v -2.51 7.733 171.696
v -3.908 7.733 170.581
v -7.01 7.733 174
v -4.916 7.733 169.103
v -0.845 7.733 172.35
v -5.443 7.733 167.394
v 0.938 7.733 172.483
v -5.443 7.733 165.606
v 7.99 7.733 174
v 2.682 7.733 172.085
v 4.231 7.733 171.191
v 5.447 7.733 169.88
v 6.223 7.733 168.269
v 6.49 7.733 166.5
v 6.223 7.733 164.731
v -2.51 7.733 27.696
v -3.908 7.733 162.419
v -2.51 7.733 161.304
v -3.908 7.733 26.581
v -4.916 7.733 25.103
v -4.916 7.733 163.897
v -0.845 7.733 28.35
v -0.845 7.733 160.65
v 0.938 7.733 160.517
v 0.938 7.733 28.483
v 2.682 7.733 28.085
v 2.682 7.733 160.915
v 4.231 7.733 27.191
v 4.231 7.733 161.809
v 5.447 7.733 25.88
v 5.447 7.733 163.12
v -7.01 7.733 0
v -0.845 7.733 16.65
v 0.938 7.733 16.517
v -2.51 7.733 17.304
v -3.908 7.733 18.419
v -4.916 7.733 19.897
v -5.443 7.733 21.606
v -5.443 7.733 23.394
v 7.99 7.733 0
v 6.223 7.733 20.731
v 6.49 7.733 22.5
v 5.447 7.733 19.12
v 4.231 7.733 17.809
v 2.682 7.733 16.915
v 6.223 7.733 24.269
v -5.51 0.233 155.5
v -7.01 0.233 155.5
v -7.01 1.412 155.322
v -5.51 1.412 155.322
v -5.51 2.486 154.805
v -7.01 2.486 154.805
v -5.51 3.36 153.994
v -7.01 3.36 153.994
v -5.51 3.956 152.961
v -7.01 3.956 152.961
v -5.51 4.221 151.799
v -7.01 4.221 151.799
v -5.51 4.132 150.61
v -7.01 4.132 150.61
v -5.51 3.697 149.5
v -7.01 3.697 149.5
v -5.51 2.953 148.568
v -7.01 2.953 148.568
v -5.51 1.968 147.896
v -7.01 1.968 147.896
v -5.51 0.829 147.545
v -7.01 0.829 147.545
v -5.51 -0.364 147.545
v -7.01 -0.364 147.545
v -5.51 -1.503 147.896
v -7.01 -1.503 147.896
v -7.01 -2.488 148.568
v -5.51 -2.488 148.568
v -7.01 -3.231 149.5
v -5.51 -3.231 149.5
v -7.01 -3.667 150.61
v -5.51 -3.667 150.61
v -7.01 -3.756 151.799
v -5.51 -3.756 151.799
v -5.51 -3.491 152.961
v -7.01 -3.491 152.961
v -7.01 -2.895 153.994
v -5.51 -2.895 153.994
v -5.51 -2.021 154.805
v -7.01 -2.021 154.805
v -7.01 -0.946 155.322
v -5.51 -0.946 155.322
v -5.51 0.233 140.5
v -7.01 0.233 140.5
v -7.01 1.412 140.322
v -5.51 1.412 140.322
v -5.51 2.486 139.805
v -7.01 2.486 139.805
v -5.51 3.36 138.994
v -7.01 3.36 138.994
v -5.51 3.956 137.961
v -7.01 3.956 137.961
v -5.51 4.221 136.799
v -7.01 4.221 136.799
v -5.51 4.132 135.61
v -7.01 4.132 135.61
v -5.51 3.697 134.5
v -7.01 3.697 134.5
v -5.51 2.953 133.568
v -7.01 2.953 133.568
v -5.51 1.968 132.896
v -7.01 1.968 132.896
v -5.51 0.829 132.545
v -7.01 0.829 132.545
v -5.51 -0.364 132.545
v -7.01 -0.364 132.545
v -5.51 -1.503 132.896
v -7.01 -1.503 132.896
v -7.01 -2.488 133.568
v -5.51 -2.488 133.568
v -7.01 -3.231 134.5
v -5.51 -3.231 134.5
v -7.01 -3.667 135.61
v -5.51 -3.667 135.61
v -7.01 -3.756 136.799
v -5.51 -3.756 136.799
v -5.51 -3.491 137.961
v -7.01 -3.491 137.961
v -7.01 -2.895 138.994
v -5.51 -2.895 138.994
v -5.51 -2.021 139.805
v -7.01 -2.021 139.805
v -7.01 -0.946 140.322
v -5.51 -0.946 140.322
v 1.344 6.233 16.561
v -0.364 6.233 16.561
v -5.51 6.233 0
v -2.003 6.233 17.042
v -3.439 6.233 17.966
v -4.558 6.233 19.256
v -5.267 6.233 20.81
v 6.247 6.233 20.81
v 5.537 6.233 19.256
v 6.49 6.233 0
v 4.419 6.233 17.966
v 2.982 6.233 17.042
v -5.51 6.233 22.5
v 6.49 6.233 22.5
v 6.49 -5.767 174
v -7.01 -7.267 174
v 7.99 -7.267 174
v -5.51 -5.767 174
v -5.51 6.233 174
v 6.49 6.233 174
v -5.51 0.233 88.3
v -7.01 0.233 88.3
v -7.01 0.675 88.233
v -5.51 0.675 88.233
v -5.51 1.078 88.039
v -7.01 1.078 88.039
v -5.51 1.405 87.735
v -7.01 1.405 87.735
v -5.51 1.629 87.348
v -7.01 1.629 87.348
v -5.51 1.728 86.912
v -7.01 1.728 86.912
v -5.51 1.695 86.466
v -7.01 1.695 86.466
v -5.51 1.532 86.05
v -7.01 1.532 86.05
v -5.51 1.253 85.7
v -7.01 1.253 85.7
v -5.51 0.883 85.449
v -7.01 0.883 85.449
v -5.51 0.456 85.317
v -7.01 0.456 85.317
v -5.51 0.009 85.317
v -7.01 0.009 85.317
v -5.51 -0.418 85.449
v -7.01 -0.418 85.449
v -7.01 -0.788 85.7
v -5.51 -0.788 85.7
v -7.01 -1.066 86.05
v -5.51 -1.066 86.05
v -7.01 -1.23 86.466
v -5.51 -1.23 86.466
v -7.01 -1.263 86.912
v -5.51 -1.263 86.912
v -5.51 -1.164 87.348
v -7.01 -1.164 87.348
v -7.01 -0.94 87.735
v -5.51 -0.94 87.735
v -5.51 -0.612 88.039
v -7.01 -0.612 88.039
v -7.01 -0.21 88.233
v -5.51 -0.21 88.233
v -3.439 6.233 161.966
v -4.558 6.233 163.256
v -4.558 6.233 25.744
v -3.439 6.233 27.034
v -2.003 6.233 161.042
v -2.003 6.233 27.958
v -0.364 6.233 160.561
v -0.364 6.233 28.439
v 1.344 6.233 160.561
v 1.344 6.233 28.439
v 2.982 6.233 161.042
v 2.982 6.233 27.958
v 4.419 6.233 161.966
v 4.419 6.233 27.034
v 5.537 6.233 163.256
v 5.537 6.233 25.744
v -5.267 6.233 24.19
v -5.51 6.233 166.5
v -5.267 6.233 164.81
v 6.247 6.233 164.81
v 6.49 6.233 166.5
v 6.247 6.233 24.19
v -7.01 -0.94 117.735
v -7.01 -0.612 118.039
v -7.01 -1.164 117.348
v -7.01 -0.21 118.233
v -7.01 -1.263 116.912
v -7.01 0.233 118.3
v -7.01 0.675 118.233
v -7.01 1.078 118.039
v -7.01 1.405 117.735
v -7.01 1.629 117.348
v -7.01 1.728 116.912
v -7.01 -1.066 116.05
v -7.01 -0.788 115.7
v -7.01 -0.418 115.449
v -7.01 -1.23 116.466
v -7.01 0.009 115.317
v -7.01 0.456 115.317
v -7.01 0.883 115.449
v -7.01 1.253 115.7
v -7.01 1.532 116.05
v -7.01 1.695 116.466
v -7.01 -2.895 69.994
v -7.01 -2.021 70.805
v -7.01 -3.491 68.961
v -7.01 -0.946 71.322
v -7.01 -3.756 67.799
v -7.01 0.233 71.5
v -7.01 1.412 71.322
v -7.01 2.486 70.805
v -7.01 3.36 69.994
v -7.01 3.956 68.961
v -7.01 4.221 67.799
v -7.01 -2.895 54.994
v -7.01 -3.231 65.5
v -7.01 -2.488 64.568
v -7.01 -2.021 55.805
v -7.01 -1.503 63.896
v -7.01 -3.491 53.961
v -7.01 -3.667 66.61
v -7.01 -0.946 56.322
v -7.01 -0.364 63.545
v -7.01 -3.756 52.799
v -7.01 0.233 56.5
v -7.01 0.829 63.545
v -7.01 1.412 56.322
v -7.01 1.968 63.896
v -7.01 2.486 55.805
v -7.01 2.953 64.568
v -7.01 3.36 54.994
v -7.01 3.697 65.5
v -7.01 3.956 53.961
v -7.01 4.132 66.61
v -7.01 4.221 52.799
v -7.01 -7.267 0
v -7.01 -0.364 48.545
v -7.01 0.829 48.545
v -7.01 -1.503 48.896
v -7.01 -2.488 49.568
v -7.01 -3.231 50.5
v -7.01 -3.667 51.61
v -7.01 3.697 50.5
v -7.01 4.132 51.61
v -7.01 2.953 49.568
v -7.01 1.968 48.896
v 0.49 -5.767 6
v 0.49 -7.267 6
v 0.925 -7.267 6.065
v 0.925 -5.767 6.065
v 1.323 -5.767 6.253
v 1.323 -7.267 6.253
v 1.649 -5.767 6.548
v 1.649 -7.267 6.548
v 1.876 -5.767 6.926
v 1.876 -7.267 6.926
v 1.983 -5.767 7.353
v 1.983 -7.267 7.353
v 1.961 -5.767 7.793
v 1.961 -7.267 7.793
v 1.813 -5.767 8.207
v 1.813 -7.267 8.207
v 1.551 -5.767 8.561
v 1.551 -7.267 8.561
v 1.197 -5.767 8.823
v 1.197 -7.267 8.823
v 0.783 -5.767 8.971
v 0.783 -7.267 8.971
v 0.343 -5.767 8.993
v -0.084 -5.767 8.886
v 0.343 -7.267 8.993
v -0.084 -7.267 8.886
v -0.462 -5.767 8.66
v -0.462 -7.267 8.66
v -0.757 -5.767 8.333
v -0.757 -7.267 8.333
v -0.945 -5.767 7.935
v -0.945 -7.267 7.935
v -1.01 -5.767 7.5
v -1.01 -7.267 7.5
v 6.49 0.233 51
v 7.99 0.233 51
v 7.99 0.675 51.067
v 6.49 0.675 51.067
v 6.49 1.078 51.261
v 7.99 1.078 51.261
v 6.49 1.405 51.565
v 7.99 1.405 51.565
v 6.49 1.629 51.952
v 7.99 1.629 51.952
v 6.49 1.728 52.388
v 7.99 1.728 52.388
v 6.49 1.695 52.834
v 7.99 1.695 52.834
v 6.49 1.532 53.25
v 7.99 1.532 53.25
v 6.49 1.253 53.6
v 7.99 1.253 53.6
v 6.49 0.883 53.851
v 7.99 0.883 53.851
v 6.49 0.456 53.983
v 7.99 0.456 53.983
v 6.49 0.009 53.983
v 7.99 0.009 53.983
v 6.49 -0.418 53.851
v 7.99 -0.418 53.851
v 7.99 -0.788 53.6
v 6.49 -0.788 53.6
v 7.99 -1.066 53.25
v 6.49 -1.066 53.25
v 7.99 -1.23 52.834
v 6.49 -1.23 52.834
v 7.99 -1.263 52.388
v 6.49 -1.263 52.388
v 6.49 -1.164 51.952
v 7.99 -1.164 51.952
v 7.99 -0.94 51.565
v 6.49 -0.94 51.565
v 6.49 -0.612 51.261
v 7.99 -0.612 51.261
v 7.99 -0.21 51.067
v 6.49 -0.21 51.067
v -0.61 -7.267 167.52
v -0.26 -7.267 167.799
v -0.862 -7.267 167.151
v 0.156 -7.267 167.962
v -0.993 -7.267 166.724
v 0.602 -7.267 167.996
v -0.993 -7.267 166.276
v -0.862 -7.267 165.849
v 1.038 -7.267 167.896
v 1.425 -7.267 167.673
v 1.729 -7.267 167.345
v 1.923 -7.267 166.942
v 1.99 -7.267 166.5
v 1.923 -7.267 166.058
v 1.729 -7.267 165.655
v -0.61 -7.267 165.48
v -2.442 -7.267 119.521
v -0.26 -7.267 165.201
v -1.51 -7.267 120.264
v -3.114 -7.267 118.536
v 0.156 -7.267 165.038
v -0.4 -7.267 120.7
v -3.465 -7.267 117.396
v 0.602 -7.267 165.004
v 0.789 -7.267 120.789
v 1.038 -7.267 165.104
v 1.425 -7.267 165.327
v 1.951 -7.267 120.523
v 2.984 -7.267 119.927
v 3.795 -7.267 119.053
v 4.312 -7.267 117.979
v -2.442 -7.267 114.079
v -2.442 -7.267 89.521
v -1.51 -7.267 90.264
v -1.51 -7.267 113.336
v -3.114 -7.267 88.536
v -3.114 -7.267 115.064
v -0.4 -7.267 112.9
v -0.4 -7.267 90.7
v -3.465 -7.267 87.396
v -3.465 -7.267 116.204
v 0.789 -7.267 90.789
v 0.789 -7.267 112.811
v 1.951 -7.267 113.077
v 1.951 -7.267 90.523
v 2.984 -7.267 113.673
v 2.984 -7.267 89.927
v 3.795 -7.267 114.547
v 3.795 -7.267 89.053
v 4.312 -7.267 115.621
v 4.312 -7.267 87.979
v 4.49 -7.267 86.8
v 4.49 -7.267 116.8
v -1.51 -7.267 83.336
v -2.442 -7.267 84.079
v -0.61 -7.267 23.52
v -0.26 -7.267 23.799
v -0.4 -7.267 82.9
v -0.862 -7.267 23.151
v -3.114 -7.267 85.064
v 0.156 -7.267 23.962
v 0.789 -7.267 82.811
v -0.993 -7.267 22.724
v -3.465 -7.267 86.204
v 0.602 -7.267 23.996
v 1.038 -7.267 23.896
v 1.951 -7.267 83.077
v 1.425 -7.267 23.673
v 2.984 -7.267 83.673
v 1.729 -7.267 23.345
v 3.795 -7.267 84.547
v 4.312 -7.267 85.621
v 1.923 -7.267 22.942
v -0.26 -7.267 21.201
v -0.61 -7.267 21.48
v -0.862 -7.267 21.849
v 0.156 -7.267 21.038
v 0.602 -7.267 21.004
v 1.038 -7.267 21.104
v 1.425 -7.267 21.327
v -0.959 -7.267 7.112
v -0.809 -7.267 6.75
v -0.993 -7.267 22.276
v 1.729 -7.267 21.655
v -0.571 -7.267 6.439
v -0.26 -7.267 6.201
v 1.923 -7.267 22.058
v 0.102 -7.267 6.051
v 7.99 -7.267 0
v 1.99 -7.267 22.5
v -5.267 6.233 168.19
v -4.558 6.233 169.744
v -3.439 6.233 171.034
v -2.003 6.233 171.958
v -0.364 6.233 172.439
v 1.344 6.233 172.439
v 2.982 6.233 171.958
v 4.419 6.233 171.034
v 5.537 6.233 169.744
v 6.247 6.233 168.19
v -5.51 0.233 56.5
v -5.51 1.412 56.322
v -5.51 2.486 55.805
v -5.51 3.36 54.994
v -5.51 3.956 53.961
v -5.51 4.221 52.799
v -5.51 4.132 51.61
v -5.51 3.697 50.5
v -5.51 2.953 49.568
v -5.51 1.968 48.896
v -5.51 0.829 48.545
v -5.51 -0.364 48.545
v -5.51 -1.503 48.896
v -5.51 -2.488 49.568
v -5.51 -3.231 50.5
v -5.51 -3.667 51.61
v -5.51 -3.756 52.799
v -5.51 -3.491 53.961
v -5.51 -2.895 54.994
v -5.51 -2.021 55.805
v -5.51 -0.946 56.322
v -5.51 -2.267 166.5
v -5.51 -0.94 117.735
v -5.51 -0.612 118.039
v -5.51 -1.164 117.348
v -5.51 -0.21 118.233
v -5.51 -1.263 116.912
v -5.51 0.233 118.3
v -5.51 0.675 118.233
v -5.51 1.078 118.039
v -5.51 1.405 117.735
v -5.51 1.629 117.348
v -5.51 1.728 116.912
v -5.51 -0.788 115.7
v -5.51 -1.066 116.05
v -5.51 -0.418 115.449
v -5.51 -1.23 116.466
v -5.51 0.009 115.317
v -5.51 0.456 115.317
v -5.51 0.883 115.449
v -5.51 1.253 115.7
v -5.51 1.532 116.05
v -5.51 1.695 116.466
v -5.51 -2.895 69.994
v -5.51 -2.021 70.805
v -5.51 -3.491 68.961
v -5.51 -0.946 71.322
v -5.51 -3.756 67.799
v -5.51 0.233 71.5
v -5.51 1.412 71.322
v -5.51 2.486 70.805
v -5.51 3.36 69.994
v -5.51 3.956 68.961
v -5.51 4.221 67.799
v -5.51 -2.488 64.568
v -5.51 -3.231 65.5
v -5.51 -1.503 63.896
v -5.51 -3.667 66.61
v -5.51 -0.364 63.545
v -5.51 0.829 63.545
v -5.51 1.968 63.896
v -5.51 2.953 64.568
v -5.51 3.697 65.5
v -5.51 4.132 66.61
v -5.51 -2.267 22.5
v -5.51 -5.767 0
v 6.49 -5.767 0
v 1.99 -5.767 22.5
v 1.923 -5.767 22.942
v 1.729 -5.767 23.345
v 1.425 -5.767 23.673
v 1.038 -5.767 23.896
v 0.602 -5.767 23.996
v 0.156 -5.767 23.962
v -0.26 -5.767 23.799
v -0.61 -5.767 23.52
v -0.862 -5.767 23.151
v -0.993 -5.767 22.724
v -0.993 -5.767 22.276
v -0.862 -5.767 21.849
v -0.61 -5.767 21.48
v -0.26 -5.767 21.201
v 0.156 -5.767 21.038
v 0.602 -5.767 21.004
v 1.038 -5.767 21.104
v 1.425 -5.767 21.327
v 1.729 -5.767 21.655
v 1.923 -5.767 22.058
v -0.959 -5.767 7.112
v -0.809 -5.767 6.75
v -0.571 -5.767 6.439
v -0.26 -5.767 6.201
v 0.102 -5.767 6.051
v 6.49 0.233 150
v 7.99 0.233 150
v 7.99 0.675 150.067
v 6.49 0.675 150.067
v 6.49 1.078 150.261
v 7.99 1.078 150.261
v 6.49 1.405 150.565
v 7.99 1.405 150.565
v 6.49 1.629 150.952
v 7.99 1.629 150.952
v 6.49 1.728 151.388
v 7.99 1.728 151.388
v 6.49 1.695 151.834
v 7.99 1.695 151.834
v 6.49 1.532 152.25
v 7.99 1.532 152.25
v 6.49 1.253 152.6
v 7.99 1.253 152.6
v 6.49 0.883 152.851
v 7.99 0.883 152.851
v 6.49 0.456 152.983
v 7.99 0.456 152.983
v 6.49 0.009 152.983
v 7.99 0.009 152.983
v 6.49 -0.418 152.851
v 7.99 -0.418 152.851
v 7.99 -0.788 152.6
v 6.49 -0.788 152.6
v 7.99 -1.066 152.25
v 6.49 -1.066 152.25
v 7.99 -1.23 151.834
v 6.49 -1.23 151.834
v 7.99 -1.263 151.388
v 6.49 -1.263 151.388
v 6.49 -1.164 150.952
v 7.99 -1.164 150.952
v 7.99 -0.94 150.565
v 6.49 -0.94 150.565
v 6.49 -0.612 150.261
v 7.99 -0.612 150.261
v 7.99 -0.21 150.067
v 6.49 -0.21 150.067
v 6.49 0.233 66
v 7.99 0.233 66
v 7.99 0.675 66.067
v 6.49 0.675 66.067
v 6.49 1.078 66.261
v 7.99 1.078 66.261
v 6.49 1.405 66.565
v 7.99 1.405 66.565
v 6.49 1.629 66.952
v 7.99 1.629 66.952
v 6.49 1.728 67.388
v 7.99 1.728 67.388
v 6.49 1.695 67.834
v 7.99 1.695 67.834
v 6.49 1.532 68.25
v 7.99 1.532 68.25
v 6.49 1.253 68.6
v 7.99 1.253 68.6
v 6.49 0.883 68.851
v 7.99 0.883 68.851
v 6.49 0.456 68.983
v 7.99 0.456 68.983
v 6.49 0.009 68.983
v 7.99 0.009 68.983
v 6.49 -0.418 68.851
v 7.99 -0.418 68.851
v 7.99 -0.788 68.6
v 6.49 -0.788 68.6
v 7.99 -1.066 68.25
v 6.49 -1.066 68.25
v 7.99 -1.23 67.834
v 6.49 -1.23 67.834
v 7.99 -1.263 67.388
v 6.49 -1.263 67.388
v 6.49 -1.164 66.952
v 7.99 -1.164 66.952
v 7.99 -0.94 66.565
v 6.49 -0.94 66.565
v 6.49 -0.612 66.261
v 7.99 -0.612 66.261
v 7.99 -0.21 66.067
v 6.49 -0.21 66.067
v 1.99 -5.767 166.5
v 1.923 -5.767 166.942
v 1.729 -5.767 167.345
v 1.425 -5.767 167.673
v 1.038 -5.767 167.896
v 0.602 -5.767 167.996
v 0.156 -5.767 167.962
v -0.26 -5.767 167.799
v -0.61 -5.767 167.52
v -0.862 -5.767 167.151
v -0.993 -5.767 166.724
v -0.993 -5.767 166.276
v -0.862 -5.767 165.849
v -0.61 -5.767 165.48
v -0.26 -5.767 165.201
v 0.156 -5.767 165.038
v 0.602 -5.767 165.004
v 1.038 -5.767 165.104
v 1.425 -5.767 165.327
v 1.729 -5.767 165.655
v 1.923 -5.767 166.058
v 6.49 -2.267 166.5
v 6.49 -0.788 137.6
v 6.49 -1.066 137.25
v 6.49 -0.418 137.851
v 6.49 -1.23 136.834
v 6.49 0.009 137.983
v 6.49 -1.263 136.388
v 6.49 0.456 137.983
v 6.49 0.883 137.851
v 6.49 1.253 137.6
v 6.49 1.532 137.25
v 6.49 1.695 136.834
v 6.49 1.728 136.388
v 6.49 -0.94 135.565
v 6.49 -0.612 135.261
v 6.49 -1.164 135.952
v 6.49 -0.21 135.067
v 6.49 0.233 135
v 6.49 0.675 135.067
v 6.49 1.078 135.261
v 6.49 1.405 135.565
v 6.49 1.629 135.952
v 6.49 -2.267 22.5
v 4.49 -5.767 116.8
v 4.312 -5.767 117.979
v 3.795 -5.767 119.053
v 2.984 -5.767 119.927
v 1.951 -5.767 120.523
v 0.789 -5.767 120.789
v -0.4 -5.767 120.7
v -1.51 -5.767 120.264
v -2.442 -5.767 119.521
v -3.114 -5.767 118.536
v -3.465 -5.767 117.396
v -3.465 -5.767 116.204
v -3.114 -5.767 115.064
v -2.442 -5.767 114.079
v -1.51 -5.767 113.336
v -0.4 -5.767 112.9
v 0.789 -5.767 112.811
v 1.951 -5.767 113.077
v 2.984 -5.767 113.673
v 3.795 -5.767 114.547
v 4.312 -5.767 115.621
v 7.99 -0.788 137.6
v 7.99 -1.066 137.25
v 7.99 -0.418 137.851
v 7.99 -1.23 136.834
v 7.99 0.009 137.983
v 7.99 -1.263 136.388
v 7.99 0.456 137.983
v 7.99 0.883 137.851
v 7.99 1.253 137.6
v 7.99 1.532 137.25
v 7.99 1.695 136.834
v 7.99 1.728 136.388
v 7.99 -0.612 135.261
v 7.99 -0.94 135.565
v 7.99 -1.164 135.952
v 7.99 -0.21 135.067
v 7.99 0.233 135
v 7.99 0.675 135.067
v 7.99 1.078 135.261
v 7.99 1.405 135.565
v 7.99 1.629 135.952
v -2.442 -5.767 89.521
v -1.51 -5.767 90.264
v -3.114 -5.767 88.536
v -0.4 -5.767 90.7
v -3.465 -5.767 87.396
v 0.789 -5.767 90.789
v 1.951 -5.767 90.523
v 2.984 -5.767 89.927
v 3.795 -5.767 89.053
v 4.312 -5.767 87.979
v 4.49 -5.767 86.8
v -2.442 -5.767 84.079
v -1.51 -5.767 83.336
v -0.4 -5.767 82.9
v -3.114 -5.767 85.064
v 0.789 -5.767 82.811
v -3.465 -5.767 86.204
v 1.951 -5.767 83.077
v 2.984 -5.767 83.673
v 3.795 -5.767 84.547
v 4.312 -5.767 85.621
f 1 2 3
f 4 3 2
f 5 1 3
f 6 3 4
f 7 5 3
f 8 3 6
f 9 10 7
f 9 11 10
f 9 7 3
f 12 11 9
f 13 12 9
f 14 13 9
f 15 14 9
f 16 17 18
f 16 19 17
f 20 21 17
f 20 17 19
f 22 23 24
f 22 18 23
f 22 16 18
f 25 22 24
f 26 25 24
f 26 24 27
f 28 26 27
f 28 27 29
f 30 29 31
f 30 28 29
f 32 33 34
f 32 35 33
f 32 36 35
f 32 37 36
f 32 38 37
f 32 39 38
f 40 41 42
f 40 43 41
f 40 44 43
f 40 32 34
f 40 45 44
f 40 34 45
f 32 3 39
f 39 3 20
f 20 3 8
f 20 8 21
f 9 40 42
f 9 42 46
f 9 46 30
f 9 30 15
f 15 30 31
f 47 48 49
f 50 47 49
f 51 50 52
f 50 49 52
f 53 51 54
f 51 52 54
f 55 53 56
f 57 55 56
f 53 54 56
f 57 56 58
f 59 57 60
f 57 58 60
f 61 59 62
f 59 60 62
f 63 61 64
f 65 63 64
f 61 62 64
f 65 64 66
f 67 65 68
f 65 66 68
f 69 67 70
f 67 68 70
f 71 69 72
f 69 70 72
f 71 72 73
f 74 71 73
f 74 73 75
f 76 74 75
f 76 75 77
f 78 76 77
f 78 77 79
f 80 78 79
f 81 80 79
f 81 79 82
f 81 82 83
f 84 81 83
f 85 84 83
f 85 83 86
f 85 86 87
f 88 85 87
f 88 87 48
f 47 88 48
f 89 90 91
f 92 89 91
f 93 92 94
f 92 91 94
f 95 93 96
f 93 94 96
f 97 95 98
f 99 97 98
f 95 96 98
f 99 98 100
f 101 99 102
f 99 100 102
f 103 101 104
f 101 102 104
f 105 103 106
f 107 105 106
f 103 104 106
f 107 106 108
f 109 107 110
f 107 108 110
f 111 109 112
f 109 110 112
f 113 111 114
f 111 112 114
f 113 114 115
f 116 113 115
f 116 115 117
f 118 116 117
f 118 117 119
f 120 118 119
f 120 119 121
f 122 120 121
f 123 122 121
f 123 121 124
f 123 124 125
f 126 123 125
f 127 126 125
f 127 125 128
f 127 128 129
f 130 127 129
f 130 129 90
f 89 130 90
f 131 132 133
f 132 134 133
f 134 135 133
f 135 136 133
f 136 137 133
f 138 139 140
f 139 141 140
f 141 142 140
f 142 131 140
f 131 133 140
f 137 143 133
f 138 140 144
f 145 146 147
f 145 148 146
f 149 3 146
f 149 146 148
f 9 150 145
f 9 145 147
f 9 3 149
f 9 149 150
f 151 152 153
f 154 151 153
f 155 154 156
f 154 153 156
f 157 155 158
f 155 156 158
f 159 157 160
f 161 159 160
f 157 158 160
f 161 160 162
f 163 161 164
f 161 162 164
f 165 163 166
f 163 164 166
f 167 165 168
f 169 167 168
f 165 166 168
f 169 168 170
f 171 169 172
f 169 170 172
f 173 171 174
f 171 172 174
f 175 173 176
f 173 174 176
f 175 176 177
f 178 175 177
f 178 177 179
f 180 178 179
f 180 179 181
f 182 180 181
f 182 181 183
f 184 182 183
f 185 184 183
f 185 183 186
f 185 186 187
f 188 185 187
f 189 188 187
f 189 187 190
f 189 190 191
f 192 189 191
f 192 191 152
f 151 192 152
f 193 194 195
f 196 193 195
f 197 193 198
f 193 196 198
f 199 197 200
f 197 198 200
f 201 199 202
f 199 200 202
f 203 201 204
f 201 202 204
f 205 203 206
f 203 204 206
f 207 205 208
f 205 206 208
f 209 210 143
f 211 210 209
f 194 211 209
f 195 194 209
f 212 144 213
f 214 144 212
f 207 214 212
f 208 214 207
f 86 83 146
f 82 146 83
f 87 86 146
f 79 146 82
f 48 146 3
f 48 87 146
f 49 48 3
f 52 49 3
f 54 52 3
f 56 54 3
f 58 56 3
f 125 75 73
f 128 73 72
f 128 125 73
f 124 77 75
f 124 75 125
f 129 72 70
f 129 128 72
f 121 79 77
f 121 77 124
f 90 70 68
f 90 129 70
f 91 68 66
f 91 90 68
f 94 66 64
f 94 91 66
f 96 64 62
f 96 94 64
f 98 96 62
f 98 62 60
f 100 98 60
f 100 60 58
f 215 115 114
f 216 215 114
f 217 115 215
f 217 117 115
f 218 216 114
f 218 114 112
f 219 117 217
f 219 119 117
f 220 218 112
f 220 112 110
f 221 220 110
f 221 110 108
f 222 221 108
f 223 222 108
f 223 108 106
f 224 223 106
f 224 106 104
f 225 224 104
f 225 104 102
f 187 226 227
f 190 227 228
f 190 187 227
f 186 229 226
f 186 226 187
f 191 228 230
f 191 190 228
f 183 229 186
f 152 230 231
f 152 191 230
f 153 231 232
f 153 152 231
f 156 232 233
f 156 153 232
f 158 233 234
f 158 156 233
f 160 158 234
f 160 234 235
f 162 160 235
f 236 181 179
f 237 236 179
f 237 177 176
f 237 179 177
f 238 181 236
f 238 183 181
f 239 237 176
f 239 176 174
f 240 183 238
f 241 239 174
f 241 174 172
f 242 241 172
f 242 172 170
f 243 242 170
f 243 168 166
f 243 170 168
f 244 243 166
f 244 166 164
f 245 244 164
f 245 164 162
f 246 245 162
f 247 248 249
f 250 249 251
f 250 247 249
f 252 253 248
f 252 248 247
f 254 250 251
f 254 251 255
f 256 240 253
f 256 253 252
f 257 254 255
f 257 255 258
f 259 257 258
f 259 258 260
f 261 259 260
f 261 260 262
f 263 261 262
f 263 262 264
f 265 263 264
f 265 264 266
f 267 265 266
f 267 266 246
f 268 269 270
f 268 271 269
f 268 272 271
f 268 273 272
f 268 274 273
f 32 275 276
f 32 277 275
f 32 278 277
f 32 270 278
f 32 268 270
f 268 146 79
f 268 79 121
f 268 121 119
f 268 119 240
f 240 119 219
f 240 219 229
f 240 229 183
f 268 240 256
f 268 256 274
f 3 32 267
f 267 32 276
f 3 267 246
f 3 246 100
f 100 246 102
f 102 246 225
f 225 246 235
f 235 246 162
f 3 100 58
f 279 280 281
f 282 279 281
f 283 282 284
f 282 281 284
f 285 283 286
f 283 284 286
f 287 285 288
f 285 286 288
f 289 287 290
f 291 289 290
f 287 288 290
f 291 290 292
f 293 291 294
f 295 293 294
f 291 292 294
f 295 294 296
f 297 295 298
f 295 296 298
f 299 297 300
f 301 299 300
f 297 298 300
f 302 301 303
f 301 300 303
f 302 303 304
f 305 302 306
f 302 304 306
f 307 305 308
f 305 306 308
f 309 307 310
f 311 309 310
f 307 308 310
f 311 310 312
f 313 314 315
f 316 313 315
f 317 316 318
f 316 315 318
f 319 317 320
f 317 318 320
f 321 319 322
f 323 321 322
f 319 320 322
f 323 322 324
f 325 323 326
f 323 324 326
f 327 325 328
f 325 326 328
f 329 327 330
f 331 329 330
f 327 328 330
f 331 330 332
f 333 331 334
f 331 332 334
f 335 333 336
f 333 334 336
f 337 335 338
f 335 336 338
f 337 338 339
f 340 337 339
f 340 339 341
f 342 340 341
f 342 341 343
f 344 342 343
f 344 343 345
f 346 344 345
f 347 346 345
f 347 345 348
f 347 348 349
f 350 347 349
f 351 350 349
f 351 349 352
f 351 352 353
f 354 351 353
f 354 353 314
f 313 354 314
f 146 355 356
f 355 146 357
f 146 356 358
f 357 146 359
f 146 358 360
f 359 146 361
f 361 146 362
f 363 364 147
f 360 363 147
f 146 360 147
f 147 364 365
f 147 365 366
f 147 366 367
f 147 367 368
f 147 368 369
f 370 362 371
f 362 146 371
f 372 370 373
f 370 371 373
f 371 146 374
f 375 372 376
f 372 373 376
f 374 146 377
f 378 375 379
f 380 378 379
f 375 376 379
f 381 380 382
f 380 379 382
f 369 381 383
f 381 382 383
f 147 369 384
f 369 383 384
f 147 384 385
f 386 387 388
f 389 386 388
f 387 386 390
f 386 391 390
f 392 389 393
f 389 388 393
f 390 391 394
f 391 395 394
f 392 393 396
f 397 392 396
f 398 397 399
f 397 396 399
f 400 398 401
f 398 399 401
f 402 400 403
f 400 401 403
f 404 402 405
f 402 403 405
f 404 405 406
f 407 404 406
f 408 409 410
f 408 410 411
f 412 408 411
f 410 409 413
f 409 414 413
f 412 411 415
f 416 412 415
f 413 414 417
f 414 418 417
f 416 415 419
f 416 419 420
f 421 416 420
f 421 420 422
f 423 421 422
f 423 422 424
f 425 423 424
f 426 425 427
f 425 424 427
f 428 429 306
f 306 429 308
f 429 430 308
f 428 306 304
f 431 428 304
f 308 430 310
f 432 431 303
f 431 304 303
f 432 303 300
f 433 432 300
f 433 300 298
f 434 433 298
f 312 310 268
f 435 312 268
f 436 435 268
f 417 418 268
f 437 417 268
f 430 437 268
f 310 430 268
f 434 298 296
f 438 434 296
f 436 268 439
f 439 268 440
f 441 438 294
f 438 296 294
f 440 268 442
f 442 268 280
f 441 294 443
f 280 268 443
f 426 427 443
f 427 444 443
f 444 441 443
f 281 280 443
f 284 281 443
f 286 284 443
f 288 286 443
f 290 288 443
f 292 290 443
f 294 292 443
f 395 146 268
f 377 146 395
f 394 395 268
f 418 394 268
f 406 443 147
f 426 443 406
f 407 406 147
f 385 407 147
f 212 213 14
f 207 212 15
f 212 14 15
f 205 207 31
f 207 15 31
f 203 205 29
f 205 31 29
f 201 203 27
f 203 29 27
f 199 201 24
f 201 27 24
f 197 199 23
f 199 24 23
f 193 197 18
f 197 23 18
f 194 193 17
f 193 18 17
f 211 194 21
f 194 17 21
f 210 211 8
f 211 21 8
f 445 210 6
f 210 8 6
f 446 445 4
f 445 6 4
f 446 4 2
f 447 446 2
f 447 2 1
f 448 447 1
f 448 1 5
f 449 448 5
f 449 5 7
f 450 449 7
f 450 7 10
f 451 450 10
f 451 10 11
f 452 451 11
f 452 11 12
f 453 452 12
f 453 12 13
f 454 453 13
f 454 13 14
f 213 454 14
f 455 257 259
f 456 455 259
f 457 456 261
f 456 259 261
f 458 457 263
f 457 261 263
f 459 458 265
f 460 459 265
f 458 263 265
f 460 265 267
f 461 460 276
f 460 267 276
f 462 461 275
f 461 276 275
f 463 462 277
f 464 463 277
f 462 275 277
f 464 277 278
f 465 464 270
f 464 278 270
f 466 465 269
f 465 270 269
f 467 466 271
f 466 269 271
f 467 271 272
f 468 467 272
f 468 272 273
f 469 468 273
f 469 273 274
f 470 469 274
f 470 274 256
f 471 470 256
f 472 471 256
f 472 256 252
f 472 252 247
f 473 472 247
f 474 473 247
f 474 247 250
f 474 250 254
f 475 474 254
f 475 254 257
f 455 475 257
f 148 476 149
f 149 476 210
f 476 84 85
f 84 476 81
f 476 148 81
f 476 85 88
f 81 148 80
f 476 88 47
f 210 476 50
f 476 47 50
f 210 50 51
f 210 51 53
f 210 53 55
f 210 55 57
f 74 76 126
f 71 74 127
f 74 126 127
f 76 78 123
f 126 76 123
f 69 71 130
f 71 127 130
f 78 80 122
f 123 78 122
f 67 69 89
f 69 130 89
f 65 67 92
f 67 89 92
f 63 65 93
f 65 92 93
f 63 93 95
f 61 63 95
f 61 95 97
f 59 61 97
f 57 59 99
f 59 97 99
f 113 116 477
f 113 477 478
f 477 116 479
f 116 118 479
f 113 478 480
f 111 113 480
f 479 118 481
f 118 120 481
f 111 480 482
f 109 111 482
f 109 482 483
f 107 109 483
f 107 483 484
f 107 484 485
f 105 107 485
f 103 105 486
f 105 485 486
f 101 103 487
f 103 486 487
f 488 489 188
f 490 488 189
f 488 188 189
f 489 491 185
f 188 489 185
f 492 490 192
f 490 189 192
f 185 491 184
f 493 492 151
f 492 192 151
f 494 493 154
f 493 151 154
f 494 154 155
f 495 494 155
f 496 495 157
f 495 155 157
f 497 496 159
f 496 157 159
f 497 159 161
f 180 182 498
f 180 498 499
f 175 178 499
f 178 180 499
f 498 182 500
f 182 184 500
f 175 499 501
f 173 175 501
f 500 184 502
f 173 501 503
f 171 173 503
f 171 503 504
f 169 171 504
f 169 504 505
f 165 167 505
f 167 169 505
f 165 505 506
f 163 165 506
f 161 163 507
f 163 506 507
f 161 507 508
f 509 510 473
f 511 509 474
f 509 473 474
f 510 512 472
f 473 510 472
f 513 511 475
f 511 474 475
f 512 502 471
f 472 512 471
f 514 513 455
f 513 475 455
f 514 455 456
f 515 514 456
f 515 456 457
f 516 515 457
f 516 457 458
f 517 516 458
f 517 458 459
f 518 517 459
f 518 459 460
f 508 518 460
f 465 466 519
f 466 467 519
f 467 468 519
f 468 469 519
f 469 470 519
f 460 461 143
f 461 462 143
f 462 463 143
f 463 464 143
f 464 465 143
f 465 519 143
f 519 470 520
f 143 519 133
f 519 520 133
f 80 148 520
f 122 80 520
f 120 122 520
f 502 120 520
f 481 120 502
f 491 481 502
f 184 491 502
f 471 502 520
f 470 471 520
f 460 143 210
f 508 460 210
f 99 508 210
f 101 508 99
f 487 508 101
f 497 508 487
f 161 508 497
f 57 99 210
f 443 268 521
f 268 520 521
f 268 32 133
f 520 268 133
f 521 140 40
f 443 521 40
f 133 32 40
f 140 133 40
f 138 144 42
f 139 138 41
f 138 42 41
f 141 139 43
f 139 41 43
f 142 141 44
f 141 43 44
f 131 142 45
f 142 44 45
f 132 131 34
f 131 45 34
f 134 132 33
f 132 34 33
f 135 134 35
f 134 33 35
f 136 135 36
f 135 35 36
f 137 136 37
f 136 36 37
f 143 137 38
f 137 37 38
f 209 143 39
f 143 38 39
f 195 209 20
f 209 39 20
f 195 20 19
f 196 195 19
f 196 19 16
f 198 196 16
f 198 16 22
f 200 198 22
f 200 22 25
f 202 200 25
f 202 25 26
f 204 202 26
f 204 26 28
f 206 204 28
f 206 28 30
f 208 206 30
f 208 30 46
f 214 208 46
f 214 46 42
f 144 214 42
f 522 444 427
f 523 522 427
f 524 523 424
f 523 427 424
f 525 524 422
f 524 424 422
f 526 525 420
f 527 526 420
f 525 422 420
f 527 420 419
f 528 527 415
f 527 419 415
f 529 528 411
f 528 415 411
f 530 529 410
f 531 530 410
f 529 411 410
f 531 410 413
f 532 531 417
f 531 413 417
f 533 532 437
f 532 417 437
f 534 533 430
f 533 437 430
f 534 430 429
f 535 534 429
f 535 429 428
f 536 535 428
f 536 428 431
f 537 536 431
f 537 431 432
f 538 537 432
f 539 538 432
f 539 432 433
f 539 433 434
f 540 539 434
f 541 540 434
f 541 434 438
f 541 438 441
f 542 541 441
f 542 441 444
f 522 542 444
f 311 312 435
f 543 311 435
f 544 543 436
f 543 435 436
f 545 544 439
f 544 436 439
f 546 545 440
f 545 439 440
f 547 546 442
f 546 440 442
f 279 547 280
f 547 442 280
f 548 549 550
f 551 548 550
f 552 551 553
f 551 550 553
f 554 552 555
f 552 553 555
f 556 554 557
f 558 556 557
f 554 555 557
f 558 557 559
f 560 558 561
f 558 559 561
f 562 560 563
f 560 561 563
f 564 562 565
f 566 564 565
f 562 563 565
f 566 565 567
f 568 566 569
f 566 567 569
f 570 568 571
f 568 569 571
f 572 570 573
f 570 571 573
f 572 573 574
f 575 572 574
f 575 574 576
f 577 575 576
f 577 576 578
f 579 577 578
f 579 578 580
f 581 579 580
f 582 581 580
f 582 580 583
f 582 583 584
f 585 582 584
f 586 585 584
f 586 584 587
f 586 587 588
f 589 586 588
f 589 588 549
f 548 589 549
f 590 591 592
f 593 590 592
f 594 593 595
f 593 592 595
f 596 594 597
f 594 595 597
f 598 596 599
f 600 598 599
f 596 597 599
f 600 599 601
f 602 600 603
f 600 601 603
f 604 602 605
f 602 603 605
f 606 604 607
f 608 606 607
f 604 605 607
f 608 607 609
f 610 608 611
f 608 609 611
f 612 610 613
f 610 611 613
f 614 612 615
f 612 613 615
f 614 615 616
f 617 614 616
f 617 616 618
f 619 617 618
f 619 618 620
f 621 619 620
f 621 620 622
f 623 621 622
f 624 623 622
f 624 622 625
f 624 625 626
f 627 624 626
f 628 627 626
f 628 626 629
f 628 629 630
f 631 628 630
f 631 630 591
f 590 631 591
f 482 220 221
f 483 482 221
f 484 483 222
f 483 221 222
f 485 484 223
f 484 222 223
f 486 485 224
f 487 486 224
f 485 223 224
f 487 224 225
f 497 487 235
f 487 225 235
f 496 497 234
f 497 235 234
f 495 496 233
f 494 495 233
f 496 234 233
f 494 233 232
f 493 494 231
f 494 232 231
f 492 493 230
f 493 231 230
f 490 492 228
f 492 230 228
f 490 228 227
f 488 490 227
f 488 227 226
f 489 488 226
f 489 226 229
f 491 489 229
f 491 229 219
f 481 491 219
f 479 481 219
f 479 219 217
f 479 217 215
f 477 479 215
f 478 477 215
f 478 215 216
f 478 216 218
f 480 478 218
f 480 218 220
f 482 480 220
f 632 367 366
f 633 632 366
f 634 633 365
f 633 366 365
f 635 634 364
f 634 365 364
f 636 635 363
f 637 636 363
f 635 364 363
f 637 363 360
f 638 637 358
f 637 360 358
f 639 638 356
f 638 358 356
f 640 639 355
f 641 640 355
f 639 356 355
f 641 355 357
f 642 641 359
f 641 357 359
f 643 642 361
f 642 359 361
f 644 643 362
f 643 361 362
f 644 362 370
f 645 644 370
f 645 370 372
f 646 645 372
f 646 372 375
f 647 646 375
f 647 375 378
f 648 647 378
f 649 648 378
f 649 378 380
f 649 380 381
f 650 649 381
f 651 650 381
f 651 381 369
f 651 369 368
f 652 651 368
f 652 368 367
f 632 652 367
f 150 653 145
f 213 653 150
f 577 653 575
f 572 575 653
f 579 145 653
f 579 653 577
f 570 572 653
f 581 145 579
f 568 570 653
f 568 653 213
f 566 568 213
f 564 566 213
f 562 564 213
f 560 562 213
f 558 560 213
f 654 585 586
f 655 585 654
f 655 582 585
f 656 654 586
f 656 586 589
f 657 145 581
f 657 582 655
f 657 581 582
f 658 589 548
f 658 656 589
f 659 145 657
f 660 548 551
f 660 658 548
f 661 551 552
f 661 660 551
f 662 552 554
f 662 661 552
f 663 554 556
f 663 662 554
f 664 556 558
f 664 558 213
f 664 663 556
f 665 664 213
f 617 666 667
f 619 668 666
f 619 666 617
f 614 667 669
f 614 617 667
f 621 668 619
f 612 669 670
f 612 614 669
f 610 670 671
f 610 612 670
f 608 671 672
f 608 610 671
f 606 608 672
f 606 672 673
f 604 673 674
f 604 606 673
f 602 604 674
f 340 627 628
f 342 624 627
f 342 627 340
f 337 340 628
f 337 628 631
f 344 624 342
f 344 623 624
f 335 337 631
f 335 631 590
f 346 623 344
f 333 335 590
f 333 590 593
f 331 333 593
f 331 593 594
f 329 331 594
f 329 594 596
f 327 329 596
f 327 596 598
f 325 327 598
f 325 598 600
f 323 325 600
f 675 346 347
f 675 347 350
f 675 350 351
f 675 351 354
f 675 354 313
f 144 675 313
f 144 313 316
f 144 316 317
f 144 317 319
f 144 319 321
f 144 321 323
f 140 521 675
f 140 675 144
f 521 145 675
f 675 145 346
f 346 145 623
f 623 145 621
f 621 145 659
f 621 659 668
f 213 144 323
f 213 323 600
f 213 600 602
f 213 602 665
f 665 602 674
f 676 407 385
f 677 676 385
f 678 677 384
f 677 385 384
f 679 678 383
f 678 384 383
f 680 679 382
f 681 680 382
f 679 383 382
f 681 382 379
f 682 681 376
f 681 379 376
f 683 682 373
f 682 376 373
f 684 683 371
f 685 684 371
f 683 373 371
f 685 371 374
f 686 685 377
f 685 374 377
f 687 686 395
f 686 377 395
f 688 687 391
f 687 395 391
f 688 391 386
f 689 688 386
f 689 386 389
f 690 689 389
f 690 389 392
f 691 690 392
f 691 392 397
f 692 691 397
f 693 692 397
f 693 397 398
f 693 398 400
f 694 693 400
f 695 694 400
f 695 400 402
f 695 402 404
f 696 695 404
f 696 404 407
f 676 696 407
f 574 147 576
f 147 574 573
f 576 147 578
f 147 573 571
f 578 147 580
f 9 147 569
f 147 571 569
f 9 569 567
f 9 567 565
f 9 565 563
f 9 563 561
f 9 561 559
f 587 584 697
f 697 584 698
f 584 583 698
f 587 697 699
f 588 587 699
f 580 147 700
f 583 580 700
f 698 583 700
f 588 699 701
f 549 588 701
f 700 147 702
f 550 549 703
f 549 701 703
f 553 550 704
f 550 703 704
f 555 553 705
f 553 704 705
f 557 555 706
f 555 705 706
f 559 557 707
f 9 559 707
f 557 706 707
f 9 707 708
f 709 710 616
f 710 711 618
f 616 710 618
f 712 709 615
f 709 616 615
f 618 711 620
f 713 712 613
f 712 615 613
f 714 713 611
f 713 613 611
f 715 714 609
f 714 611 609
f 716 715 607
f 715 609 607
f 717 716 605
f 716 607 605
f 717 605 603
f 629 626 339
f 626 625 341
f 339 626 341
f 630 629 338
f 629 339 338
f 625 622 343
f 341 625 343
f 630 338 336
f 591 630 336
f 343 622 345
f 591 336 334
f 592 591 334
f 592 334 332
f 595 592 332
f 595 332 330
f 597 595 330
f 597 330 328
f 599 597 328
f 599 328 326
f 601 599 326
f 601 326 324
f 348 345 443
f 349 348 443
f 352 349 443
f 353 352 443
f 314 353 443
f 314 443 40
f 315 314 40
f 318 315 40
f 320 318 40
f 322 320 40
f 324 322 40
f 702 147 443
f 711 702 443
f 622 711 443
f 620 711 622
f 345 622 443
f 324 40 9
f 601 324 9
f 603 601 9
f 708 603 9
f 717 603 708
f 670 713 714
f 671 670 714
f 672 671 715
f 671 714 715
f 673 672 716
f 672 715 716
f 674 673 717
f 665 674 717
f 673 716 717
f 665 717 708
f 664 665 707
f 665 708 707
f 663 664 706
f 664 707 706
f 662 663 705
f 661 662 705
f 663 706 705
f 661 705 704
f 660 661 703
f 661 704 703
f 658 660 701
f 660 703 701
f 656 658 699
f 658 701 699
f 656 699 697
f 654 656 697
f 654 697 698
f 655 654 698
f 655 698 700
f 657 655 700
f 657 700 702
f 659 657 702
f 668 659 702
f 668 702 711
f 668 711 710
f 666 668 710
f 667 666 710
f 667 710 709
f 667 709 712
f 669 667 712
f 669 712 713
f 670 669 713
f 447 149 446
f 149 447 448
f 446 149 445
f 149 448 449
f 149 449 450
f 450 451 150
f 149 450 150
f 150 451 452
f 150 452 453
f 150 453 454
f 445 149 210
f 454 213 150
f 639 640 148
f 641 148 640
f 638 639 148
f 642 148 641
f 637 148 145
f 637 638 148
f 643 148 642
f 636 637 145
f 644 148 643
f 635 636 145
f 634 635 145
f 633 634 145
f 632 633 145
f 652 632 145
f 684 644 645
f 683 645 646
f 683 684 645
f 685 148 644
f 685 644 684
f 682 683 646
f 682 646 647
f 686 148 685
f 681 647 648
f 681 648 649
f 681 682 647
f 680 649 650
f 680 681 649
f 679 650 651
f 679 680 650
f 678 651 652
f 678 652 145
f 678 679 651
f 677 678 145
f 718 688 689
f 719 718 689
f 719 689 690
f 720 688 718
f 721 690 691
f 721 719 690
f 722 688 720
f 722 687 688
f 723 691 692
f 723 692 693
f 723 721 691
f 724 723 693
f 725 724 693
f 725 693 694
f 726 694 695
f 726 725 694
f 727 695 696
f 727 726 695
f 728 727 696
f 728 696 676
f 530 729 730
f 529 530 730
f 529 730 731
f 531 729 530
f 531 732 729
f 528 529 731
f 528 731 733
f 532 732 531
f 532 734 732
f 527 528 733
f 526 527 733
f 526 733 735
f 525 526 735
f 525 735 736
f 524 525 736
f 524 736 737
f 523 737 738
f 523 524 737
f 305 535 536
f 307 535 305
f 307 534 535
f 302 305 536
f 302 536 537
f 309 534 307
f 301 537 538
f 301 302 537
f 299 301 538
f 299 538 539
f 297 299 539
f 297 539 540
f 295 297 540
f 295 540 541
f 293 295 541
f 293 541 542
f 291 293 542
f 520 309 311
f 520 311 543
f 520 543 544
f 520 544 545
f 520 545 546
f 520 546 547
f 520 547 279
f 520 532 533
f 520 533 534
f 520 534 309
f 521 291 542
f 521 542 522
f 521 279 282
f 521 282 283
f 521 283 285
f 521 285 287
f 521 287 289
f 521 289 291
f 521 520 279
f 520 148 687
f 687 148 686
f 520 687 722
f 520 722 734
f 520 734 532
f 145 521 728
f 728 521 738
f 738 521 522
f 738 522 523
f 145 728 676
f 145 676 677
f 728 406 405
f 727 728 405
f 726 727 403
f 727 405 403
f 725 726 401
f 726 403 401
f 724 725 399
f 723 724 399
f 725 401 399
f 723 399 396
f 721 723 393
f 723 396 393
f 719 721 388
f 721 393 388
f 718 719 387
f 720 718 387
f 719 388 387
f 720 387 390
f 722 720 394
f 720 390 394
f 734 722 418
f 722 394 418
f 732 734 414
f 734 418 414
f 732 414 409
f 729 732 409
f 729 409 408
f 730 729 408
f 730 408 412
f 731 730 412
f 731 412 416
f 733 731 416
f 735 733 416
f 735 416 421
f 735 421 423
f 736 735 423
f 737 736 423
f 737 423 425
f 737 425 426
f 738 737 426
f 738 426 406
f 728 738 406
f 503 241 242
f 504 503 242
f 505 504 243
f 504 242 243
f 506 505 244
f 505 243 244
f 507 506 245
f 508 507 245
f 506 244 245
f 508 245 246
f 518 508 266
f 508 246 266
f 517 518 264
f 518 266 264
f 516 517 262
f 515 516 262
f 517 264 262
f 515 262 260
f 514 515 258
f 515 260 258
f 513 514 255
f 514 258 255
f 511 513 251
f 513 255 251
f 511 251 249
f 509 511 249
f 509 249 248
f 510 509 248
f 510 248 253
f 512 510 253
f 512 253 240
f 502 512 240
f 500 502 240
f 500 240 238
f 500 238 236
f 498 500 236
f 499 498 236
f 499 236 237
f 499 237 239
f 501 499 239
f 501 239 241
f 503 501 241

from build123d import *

# Parameters (mm, degrees)
SKETCH_1_W           = 15
SKETCH_1_H           = 15
SKETCH_1_W_2         = 12
SKETCH_1_H_2         = 12
EXTRUDE_2_DEPTH      = 174
CUT_EXTRUDE_1_DEPTH  = 10
SKETCH_3_R           = 1.5
CUT_EXTRUDE_2_DEPTH  = 10
SKETCH_6_R           = 4
CUT_EXTRUDE_4_DEPTH  = 10
SKETCH_7_R           = 1.5
CUT_EXTRUDE_5_DEPTH  = 10
SKETCH_8_R           = 4
CUT_EXTRUDE_6_DEPTH  = 10
SKETCH_10_R          = 1.5
CUT_EXTRUDE_9_DEPTH  = 10
SKETCH_12_R          = 4
CUT_EXTRUDE_10_DEPTH = 10
SKETCH_13_R          = 1.5
CUT_EXTRUDE_11_DEPTH = 10
SKETCH_14_R          = 4
CUT_EXTRUDE_12_DEPTH = 10
SKETCH_15_R          = 1.5
CUT_EXTRUDE_13_DEPTH = 10
SKETCH_16_R          = 6
CUT_EXTRUDE_14_DEPTH = 10
SKETCH_17_R          = 1.5
CUT_EXTRUDE_15_DEPTH = 10
SKETCH_18_R          = 6
CUT_EXTRUDE_16_DEPTH = 10
SKETCH_19_R          = 4
CUT_EXTRUDE_17_DEPTH = 10
SKETCH_20_R          = 1.5
CUT_EXTRUDE_18_DEPTH = 10
SKETCH_21_R          = 1.5
CUT_EXTRUDE_19_DEPTH = 10
SKETCH_22_R          = 4
CUT_EXTRUDE_20_DEPTH = 10


with BuildPart() as part:
    # ｽｹｯﾁ1 → ﾎﾞｽ - 押し出し2 (new body)
    with BuildSketch(Plane.XY):
        with Locations((0.489915859, 0.232626086)):
            Rectangle(SKETCH_1_W, SKETCH_1_H)
        with Locations((0.489915859, 0.232626086)):
            Rectangle(SKETCH_1_W_2, SKETCH_1_H_2, mode=Mode.SUBTRACT)
    extrude(amount=EXTRUDE_2_DEPTH)

    # ｽｹｯﾁ2 → ｶｯﾄ - 押し出し1 (cut)
    with BuildSketch(Plane(origin=(0, -7.267373914, 0), x_dir=(-1, 0, 0), z_dir=(0, -1, 0))):
        with BuildLine():
            ThreePointArc((1.010084141, -7.5), (0.570744313, -6.439339828), (-0.489915859, -6))
            Line((-0.489915859, -6), (-0.489915859, -7.5))
            Line((-0.489915859, -7.5), (1.010084141, -7.5))
        make_face()
        with BuildLine():
            Line((-0.489915859, -7.5), (-0.489915859, -6))
            ThreePointArc((-0.489915859, -6), (-1.550576031, -8.560660172), (1.010084141, -7.5))
            Line((1.010084141, -7.5), (-0.489915859, -7.5))
        make_face()
    extrude(amount=-CUT_EXTRUDE_1_DEPTH, mode=Mode.SUBTRACT)

    # ｽｹｯﾁ3 → ｶｯﾄ - 押し出し2 (cut)
    with BuildSketch(Plane(origin=(7.989915859, 0, 0), x_dir=(0, 0, -1), z_dir=(1, 0, 0))):
        with Locations((-52.5, 0.232626086)):
            Circle(SKETCH_3_R)
    extrude(amount=-CUT_EXTRUDE_2_DEPTH, mode=Mode.SUBTRACT)

    # ｽｹｯﾁ6 → ｶｯﾄ - 押し出し4 (cut)
    with BuildSketch(Plane.ZY.offset(7.010084141)):
        with Locations((52.5, 0.232626086)):
            Circle(SKETCH_6_R)
    extrude(amount=-CUT_EXTRUDE_4_DEPTH, mode=Mode.SUBTRACT)

    # ｽｹｯﾁ7 → ｶｯﾄ - 押し出し5 (cut)
    with BuildSketch(Plane(origin=(7.989915859, 0, 0), x_dir=(0, 0, -1), z_dir=(1, 0, 0))):
        with Locations((-151.5, 0.232626086)):
            Circle(SKETCH_7_R)
    extrude(amount=-CUT_EXTRUDE_5_DEPTH, mode=Mode.SUBTRACT)

    # ｽｹｯﾁ8 → ｶｯﾄ - 押し出し6 (cut)
    with BuildSketch(Plane.ZY.offset(7.010084141)):
        with Locations((151.5, 0.232626086)):
            Circle(SKETCH_8_R)
    extrude(amount=-CUT_EXTRUDE_6_DEPTH, mode=Mode.SUBTRACT)

    # ｽｹｯﾁ10 → ｶｯﾄ - 押し出し9 (cut)
    with BuildSketch(Plane.ZY.offset(7.010084141)):
        with Locations((86.8, 0.232626086)):
            Circle(SKETCH_10_R)
    extrude(amount=-CUT_EXTRUDE_9_DEPTH, mode=Mode.SUBTRACT)

    # ｽｹｯﾁ12 → ｶｯﾄ - 押し出し10 (cut)
    with BuildSketch(Plane.XZ.offset(7.267373914)):
        with Locations((0.489915859, 86.8)):
            Circle(SKETCH_12_R)
    extrude(amount=-CUT_EXTRUDE_10_DEPTH, mode=Mode.SUBTRACT)

    # ｽｹｯﾁ13 → ｶｯﾄ - 押し出し11 (cut)
    with BuildSketch(Plane.ZY.offset(7.010084141)):
        with Locations((116.8, 0.232626086)):
            Circle(SKETCH_13_R)
    extrude(amount=-CUT_EXTRUDE_11_DEPTH, mode=Mode.SUBTRACT)

    # ｽｹｯﾁ14 → ｶｯﾄ - 押し出し12 (cut)
    with BuildSketch(Plane.XZ.offset(7.267373914)):
        with Locations((0.489915859, 116.8)):
            Circle(SKETCH_14_R)
    extrude(amount=-CUT_EXTRUDE_12_DEPTH, mode=Mode.SUBTRACT)

    # ｽｹｯﾁ15 → ｶｯﾄ - 押し出し13 (cut)
    with BuildSketch(Plane.XZ.offset(7.267373914)):
        with Locations((0.489915859, 22.5)):
            Circle(SKETCH_15_R)
    extrude(amount=-CUT_EXTRUDE_13_DEPTH, mode=Mode.SUBTRACT)

    # ｽｹｯﾁ16 → ｶｯﾄ - 押し出し14 (cut)
    with BuildSketch(Plane(origin=(0, 7.732626086, 0), x_dir=(1, 0, 0), z_dir=(0, 1, 0))):
        with Locations((0.489915859, -22.5)):
            Circle(SKETCH_16_R)
    extrude(amount=-CUT_EXTRUDE_14_DEPTH, mode=Mode.SUBTRACT)

    # ｽｹｯﾁ17 → ｶｯﾄ - 押し出し15 (cut)
    with BuildSketch(Plane.XZ.offset(7.267373914)):
        with Locations((0.489915859, 166.5)):
            Circle(SKETCH_17_R)
    extrude(amount=-CUT_EXTRUDE_15_DEPTH, mode=Mode.SUBTRACT)

    # ｽｹｯﾁ18 → ｶｯﾄ - 押し出し16 (cut)
    with BuildSketch(Plane(origin=(0, 7.732626086, 0), x_dir=(1, 0, 0), z_dir=(0, 1, 0))):
        with Locations((0.489915859, -166.5)):
            Circle(SKETCH_18_R)
    extrude(amount=-CUT_EXTRUDE_16_DEPTH, mode=Mode.SUBTRACT)

    # ｽｹｯﾁ19 → ｶｯﾄ - 押し出し17 (cut)
    with BuildSketch(Plane.ZY.offset(7.010084141)):
        with Locations((67.5, 0.232626086)):
            Circle(SKETCH_19_R)
    extrude(amount=-CUT_EXTRUDE_17_DEPTH, mode=Mode.SUBTRACT)

    # ｽｹｯﾁ20 → ｶｯﾄ - 押し出し18 (cut)
    with BuildSketch(Plane(origin=(7.989915859, 0, 0), x_dir=(0, 0, -1), z_dir=(1, 0, 0))):
        with Locations((-67.5, 0.232626086)):
            Circle(SKETCH_20_R)
    extrude(amount=-CUT_EXTRUDE_18_DEPTH, mode=Mode.SUBTRACT)

    # ｽｹｯﾁ21 → ｶｯﾄ - 押し出し19 (cut)
    with BuildSketch(Plane(origin=(7.989915859, 0, 0), x_dir=(0, 0, -1), z_dir=(1, 0, 0))):
        with Locations((-136.5, 0.232626086)):
            Circle(SKETCH_21_R)
    extrude(amount=-CUT_EXTRUDE_19_DEPTH, mode=Mode.SUBTRACT)

    # ｽｹｯﾁ22 → ｶｯﾄ - 押し出し20 (cut)
    with BuildSketch(Plane.ZY.offset(7.010084141)):
        with Locations((136.5, 0.232626086)):
            Circle(SKETCH_22_R)
    extrude(amount=-CUT_EXTRUDE_20_DEPTH, mode=Mode.SUBTRACT)


solid = part.part
